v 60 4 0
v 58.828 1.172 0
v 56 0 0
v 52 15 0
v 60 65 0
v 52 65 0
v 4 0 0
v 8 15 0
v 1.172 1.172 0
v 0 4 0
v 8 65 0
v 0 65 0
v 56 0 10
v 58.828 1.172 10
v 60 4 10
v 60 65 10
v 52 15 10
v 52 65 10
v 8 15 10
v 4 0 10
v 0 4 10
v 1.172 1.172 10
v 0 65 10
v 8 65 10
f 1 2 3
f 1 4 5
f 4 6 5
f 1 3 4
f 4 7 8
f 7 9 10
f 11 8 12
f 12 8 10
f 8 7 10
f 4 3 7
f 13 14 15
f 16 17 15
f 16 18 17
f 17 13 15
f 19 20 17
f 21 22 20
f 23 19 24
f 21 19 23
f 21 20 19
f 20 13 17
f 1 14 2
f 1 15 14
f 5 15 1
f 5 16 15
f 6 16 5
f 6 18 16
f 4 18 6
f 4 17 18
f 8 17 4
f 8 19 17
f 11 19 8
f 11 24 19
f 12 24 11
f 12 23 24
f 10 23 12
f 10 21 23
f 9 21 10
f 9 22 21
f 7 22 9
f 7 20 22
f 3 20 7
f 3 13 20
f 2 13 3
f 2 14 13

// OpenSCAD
$fn = 32;

// ----------------------------------------------------------------------
// Heat sink frame: 60 x 65 mm frame, 8 mm walls
// ----------------------------------------------------------------------

// --- parameters (mm) ---
profile_height = 10;      // extrusion height
profile_points = 12;      // points of the closed outline

profile = [[0, 4], [1.172, 1.172], [4, 0], [56, 0], [58.828, 1.172], [60, 4], [60, 65], [52, 65], [52, 15], [8, 15], [8, 65], [0, 65]];  // single closed polygon, 12 points, counter clockwise

// --- the one profile operation ---
linear_extrude(height = profile_height) polygon(points = profile);
